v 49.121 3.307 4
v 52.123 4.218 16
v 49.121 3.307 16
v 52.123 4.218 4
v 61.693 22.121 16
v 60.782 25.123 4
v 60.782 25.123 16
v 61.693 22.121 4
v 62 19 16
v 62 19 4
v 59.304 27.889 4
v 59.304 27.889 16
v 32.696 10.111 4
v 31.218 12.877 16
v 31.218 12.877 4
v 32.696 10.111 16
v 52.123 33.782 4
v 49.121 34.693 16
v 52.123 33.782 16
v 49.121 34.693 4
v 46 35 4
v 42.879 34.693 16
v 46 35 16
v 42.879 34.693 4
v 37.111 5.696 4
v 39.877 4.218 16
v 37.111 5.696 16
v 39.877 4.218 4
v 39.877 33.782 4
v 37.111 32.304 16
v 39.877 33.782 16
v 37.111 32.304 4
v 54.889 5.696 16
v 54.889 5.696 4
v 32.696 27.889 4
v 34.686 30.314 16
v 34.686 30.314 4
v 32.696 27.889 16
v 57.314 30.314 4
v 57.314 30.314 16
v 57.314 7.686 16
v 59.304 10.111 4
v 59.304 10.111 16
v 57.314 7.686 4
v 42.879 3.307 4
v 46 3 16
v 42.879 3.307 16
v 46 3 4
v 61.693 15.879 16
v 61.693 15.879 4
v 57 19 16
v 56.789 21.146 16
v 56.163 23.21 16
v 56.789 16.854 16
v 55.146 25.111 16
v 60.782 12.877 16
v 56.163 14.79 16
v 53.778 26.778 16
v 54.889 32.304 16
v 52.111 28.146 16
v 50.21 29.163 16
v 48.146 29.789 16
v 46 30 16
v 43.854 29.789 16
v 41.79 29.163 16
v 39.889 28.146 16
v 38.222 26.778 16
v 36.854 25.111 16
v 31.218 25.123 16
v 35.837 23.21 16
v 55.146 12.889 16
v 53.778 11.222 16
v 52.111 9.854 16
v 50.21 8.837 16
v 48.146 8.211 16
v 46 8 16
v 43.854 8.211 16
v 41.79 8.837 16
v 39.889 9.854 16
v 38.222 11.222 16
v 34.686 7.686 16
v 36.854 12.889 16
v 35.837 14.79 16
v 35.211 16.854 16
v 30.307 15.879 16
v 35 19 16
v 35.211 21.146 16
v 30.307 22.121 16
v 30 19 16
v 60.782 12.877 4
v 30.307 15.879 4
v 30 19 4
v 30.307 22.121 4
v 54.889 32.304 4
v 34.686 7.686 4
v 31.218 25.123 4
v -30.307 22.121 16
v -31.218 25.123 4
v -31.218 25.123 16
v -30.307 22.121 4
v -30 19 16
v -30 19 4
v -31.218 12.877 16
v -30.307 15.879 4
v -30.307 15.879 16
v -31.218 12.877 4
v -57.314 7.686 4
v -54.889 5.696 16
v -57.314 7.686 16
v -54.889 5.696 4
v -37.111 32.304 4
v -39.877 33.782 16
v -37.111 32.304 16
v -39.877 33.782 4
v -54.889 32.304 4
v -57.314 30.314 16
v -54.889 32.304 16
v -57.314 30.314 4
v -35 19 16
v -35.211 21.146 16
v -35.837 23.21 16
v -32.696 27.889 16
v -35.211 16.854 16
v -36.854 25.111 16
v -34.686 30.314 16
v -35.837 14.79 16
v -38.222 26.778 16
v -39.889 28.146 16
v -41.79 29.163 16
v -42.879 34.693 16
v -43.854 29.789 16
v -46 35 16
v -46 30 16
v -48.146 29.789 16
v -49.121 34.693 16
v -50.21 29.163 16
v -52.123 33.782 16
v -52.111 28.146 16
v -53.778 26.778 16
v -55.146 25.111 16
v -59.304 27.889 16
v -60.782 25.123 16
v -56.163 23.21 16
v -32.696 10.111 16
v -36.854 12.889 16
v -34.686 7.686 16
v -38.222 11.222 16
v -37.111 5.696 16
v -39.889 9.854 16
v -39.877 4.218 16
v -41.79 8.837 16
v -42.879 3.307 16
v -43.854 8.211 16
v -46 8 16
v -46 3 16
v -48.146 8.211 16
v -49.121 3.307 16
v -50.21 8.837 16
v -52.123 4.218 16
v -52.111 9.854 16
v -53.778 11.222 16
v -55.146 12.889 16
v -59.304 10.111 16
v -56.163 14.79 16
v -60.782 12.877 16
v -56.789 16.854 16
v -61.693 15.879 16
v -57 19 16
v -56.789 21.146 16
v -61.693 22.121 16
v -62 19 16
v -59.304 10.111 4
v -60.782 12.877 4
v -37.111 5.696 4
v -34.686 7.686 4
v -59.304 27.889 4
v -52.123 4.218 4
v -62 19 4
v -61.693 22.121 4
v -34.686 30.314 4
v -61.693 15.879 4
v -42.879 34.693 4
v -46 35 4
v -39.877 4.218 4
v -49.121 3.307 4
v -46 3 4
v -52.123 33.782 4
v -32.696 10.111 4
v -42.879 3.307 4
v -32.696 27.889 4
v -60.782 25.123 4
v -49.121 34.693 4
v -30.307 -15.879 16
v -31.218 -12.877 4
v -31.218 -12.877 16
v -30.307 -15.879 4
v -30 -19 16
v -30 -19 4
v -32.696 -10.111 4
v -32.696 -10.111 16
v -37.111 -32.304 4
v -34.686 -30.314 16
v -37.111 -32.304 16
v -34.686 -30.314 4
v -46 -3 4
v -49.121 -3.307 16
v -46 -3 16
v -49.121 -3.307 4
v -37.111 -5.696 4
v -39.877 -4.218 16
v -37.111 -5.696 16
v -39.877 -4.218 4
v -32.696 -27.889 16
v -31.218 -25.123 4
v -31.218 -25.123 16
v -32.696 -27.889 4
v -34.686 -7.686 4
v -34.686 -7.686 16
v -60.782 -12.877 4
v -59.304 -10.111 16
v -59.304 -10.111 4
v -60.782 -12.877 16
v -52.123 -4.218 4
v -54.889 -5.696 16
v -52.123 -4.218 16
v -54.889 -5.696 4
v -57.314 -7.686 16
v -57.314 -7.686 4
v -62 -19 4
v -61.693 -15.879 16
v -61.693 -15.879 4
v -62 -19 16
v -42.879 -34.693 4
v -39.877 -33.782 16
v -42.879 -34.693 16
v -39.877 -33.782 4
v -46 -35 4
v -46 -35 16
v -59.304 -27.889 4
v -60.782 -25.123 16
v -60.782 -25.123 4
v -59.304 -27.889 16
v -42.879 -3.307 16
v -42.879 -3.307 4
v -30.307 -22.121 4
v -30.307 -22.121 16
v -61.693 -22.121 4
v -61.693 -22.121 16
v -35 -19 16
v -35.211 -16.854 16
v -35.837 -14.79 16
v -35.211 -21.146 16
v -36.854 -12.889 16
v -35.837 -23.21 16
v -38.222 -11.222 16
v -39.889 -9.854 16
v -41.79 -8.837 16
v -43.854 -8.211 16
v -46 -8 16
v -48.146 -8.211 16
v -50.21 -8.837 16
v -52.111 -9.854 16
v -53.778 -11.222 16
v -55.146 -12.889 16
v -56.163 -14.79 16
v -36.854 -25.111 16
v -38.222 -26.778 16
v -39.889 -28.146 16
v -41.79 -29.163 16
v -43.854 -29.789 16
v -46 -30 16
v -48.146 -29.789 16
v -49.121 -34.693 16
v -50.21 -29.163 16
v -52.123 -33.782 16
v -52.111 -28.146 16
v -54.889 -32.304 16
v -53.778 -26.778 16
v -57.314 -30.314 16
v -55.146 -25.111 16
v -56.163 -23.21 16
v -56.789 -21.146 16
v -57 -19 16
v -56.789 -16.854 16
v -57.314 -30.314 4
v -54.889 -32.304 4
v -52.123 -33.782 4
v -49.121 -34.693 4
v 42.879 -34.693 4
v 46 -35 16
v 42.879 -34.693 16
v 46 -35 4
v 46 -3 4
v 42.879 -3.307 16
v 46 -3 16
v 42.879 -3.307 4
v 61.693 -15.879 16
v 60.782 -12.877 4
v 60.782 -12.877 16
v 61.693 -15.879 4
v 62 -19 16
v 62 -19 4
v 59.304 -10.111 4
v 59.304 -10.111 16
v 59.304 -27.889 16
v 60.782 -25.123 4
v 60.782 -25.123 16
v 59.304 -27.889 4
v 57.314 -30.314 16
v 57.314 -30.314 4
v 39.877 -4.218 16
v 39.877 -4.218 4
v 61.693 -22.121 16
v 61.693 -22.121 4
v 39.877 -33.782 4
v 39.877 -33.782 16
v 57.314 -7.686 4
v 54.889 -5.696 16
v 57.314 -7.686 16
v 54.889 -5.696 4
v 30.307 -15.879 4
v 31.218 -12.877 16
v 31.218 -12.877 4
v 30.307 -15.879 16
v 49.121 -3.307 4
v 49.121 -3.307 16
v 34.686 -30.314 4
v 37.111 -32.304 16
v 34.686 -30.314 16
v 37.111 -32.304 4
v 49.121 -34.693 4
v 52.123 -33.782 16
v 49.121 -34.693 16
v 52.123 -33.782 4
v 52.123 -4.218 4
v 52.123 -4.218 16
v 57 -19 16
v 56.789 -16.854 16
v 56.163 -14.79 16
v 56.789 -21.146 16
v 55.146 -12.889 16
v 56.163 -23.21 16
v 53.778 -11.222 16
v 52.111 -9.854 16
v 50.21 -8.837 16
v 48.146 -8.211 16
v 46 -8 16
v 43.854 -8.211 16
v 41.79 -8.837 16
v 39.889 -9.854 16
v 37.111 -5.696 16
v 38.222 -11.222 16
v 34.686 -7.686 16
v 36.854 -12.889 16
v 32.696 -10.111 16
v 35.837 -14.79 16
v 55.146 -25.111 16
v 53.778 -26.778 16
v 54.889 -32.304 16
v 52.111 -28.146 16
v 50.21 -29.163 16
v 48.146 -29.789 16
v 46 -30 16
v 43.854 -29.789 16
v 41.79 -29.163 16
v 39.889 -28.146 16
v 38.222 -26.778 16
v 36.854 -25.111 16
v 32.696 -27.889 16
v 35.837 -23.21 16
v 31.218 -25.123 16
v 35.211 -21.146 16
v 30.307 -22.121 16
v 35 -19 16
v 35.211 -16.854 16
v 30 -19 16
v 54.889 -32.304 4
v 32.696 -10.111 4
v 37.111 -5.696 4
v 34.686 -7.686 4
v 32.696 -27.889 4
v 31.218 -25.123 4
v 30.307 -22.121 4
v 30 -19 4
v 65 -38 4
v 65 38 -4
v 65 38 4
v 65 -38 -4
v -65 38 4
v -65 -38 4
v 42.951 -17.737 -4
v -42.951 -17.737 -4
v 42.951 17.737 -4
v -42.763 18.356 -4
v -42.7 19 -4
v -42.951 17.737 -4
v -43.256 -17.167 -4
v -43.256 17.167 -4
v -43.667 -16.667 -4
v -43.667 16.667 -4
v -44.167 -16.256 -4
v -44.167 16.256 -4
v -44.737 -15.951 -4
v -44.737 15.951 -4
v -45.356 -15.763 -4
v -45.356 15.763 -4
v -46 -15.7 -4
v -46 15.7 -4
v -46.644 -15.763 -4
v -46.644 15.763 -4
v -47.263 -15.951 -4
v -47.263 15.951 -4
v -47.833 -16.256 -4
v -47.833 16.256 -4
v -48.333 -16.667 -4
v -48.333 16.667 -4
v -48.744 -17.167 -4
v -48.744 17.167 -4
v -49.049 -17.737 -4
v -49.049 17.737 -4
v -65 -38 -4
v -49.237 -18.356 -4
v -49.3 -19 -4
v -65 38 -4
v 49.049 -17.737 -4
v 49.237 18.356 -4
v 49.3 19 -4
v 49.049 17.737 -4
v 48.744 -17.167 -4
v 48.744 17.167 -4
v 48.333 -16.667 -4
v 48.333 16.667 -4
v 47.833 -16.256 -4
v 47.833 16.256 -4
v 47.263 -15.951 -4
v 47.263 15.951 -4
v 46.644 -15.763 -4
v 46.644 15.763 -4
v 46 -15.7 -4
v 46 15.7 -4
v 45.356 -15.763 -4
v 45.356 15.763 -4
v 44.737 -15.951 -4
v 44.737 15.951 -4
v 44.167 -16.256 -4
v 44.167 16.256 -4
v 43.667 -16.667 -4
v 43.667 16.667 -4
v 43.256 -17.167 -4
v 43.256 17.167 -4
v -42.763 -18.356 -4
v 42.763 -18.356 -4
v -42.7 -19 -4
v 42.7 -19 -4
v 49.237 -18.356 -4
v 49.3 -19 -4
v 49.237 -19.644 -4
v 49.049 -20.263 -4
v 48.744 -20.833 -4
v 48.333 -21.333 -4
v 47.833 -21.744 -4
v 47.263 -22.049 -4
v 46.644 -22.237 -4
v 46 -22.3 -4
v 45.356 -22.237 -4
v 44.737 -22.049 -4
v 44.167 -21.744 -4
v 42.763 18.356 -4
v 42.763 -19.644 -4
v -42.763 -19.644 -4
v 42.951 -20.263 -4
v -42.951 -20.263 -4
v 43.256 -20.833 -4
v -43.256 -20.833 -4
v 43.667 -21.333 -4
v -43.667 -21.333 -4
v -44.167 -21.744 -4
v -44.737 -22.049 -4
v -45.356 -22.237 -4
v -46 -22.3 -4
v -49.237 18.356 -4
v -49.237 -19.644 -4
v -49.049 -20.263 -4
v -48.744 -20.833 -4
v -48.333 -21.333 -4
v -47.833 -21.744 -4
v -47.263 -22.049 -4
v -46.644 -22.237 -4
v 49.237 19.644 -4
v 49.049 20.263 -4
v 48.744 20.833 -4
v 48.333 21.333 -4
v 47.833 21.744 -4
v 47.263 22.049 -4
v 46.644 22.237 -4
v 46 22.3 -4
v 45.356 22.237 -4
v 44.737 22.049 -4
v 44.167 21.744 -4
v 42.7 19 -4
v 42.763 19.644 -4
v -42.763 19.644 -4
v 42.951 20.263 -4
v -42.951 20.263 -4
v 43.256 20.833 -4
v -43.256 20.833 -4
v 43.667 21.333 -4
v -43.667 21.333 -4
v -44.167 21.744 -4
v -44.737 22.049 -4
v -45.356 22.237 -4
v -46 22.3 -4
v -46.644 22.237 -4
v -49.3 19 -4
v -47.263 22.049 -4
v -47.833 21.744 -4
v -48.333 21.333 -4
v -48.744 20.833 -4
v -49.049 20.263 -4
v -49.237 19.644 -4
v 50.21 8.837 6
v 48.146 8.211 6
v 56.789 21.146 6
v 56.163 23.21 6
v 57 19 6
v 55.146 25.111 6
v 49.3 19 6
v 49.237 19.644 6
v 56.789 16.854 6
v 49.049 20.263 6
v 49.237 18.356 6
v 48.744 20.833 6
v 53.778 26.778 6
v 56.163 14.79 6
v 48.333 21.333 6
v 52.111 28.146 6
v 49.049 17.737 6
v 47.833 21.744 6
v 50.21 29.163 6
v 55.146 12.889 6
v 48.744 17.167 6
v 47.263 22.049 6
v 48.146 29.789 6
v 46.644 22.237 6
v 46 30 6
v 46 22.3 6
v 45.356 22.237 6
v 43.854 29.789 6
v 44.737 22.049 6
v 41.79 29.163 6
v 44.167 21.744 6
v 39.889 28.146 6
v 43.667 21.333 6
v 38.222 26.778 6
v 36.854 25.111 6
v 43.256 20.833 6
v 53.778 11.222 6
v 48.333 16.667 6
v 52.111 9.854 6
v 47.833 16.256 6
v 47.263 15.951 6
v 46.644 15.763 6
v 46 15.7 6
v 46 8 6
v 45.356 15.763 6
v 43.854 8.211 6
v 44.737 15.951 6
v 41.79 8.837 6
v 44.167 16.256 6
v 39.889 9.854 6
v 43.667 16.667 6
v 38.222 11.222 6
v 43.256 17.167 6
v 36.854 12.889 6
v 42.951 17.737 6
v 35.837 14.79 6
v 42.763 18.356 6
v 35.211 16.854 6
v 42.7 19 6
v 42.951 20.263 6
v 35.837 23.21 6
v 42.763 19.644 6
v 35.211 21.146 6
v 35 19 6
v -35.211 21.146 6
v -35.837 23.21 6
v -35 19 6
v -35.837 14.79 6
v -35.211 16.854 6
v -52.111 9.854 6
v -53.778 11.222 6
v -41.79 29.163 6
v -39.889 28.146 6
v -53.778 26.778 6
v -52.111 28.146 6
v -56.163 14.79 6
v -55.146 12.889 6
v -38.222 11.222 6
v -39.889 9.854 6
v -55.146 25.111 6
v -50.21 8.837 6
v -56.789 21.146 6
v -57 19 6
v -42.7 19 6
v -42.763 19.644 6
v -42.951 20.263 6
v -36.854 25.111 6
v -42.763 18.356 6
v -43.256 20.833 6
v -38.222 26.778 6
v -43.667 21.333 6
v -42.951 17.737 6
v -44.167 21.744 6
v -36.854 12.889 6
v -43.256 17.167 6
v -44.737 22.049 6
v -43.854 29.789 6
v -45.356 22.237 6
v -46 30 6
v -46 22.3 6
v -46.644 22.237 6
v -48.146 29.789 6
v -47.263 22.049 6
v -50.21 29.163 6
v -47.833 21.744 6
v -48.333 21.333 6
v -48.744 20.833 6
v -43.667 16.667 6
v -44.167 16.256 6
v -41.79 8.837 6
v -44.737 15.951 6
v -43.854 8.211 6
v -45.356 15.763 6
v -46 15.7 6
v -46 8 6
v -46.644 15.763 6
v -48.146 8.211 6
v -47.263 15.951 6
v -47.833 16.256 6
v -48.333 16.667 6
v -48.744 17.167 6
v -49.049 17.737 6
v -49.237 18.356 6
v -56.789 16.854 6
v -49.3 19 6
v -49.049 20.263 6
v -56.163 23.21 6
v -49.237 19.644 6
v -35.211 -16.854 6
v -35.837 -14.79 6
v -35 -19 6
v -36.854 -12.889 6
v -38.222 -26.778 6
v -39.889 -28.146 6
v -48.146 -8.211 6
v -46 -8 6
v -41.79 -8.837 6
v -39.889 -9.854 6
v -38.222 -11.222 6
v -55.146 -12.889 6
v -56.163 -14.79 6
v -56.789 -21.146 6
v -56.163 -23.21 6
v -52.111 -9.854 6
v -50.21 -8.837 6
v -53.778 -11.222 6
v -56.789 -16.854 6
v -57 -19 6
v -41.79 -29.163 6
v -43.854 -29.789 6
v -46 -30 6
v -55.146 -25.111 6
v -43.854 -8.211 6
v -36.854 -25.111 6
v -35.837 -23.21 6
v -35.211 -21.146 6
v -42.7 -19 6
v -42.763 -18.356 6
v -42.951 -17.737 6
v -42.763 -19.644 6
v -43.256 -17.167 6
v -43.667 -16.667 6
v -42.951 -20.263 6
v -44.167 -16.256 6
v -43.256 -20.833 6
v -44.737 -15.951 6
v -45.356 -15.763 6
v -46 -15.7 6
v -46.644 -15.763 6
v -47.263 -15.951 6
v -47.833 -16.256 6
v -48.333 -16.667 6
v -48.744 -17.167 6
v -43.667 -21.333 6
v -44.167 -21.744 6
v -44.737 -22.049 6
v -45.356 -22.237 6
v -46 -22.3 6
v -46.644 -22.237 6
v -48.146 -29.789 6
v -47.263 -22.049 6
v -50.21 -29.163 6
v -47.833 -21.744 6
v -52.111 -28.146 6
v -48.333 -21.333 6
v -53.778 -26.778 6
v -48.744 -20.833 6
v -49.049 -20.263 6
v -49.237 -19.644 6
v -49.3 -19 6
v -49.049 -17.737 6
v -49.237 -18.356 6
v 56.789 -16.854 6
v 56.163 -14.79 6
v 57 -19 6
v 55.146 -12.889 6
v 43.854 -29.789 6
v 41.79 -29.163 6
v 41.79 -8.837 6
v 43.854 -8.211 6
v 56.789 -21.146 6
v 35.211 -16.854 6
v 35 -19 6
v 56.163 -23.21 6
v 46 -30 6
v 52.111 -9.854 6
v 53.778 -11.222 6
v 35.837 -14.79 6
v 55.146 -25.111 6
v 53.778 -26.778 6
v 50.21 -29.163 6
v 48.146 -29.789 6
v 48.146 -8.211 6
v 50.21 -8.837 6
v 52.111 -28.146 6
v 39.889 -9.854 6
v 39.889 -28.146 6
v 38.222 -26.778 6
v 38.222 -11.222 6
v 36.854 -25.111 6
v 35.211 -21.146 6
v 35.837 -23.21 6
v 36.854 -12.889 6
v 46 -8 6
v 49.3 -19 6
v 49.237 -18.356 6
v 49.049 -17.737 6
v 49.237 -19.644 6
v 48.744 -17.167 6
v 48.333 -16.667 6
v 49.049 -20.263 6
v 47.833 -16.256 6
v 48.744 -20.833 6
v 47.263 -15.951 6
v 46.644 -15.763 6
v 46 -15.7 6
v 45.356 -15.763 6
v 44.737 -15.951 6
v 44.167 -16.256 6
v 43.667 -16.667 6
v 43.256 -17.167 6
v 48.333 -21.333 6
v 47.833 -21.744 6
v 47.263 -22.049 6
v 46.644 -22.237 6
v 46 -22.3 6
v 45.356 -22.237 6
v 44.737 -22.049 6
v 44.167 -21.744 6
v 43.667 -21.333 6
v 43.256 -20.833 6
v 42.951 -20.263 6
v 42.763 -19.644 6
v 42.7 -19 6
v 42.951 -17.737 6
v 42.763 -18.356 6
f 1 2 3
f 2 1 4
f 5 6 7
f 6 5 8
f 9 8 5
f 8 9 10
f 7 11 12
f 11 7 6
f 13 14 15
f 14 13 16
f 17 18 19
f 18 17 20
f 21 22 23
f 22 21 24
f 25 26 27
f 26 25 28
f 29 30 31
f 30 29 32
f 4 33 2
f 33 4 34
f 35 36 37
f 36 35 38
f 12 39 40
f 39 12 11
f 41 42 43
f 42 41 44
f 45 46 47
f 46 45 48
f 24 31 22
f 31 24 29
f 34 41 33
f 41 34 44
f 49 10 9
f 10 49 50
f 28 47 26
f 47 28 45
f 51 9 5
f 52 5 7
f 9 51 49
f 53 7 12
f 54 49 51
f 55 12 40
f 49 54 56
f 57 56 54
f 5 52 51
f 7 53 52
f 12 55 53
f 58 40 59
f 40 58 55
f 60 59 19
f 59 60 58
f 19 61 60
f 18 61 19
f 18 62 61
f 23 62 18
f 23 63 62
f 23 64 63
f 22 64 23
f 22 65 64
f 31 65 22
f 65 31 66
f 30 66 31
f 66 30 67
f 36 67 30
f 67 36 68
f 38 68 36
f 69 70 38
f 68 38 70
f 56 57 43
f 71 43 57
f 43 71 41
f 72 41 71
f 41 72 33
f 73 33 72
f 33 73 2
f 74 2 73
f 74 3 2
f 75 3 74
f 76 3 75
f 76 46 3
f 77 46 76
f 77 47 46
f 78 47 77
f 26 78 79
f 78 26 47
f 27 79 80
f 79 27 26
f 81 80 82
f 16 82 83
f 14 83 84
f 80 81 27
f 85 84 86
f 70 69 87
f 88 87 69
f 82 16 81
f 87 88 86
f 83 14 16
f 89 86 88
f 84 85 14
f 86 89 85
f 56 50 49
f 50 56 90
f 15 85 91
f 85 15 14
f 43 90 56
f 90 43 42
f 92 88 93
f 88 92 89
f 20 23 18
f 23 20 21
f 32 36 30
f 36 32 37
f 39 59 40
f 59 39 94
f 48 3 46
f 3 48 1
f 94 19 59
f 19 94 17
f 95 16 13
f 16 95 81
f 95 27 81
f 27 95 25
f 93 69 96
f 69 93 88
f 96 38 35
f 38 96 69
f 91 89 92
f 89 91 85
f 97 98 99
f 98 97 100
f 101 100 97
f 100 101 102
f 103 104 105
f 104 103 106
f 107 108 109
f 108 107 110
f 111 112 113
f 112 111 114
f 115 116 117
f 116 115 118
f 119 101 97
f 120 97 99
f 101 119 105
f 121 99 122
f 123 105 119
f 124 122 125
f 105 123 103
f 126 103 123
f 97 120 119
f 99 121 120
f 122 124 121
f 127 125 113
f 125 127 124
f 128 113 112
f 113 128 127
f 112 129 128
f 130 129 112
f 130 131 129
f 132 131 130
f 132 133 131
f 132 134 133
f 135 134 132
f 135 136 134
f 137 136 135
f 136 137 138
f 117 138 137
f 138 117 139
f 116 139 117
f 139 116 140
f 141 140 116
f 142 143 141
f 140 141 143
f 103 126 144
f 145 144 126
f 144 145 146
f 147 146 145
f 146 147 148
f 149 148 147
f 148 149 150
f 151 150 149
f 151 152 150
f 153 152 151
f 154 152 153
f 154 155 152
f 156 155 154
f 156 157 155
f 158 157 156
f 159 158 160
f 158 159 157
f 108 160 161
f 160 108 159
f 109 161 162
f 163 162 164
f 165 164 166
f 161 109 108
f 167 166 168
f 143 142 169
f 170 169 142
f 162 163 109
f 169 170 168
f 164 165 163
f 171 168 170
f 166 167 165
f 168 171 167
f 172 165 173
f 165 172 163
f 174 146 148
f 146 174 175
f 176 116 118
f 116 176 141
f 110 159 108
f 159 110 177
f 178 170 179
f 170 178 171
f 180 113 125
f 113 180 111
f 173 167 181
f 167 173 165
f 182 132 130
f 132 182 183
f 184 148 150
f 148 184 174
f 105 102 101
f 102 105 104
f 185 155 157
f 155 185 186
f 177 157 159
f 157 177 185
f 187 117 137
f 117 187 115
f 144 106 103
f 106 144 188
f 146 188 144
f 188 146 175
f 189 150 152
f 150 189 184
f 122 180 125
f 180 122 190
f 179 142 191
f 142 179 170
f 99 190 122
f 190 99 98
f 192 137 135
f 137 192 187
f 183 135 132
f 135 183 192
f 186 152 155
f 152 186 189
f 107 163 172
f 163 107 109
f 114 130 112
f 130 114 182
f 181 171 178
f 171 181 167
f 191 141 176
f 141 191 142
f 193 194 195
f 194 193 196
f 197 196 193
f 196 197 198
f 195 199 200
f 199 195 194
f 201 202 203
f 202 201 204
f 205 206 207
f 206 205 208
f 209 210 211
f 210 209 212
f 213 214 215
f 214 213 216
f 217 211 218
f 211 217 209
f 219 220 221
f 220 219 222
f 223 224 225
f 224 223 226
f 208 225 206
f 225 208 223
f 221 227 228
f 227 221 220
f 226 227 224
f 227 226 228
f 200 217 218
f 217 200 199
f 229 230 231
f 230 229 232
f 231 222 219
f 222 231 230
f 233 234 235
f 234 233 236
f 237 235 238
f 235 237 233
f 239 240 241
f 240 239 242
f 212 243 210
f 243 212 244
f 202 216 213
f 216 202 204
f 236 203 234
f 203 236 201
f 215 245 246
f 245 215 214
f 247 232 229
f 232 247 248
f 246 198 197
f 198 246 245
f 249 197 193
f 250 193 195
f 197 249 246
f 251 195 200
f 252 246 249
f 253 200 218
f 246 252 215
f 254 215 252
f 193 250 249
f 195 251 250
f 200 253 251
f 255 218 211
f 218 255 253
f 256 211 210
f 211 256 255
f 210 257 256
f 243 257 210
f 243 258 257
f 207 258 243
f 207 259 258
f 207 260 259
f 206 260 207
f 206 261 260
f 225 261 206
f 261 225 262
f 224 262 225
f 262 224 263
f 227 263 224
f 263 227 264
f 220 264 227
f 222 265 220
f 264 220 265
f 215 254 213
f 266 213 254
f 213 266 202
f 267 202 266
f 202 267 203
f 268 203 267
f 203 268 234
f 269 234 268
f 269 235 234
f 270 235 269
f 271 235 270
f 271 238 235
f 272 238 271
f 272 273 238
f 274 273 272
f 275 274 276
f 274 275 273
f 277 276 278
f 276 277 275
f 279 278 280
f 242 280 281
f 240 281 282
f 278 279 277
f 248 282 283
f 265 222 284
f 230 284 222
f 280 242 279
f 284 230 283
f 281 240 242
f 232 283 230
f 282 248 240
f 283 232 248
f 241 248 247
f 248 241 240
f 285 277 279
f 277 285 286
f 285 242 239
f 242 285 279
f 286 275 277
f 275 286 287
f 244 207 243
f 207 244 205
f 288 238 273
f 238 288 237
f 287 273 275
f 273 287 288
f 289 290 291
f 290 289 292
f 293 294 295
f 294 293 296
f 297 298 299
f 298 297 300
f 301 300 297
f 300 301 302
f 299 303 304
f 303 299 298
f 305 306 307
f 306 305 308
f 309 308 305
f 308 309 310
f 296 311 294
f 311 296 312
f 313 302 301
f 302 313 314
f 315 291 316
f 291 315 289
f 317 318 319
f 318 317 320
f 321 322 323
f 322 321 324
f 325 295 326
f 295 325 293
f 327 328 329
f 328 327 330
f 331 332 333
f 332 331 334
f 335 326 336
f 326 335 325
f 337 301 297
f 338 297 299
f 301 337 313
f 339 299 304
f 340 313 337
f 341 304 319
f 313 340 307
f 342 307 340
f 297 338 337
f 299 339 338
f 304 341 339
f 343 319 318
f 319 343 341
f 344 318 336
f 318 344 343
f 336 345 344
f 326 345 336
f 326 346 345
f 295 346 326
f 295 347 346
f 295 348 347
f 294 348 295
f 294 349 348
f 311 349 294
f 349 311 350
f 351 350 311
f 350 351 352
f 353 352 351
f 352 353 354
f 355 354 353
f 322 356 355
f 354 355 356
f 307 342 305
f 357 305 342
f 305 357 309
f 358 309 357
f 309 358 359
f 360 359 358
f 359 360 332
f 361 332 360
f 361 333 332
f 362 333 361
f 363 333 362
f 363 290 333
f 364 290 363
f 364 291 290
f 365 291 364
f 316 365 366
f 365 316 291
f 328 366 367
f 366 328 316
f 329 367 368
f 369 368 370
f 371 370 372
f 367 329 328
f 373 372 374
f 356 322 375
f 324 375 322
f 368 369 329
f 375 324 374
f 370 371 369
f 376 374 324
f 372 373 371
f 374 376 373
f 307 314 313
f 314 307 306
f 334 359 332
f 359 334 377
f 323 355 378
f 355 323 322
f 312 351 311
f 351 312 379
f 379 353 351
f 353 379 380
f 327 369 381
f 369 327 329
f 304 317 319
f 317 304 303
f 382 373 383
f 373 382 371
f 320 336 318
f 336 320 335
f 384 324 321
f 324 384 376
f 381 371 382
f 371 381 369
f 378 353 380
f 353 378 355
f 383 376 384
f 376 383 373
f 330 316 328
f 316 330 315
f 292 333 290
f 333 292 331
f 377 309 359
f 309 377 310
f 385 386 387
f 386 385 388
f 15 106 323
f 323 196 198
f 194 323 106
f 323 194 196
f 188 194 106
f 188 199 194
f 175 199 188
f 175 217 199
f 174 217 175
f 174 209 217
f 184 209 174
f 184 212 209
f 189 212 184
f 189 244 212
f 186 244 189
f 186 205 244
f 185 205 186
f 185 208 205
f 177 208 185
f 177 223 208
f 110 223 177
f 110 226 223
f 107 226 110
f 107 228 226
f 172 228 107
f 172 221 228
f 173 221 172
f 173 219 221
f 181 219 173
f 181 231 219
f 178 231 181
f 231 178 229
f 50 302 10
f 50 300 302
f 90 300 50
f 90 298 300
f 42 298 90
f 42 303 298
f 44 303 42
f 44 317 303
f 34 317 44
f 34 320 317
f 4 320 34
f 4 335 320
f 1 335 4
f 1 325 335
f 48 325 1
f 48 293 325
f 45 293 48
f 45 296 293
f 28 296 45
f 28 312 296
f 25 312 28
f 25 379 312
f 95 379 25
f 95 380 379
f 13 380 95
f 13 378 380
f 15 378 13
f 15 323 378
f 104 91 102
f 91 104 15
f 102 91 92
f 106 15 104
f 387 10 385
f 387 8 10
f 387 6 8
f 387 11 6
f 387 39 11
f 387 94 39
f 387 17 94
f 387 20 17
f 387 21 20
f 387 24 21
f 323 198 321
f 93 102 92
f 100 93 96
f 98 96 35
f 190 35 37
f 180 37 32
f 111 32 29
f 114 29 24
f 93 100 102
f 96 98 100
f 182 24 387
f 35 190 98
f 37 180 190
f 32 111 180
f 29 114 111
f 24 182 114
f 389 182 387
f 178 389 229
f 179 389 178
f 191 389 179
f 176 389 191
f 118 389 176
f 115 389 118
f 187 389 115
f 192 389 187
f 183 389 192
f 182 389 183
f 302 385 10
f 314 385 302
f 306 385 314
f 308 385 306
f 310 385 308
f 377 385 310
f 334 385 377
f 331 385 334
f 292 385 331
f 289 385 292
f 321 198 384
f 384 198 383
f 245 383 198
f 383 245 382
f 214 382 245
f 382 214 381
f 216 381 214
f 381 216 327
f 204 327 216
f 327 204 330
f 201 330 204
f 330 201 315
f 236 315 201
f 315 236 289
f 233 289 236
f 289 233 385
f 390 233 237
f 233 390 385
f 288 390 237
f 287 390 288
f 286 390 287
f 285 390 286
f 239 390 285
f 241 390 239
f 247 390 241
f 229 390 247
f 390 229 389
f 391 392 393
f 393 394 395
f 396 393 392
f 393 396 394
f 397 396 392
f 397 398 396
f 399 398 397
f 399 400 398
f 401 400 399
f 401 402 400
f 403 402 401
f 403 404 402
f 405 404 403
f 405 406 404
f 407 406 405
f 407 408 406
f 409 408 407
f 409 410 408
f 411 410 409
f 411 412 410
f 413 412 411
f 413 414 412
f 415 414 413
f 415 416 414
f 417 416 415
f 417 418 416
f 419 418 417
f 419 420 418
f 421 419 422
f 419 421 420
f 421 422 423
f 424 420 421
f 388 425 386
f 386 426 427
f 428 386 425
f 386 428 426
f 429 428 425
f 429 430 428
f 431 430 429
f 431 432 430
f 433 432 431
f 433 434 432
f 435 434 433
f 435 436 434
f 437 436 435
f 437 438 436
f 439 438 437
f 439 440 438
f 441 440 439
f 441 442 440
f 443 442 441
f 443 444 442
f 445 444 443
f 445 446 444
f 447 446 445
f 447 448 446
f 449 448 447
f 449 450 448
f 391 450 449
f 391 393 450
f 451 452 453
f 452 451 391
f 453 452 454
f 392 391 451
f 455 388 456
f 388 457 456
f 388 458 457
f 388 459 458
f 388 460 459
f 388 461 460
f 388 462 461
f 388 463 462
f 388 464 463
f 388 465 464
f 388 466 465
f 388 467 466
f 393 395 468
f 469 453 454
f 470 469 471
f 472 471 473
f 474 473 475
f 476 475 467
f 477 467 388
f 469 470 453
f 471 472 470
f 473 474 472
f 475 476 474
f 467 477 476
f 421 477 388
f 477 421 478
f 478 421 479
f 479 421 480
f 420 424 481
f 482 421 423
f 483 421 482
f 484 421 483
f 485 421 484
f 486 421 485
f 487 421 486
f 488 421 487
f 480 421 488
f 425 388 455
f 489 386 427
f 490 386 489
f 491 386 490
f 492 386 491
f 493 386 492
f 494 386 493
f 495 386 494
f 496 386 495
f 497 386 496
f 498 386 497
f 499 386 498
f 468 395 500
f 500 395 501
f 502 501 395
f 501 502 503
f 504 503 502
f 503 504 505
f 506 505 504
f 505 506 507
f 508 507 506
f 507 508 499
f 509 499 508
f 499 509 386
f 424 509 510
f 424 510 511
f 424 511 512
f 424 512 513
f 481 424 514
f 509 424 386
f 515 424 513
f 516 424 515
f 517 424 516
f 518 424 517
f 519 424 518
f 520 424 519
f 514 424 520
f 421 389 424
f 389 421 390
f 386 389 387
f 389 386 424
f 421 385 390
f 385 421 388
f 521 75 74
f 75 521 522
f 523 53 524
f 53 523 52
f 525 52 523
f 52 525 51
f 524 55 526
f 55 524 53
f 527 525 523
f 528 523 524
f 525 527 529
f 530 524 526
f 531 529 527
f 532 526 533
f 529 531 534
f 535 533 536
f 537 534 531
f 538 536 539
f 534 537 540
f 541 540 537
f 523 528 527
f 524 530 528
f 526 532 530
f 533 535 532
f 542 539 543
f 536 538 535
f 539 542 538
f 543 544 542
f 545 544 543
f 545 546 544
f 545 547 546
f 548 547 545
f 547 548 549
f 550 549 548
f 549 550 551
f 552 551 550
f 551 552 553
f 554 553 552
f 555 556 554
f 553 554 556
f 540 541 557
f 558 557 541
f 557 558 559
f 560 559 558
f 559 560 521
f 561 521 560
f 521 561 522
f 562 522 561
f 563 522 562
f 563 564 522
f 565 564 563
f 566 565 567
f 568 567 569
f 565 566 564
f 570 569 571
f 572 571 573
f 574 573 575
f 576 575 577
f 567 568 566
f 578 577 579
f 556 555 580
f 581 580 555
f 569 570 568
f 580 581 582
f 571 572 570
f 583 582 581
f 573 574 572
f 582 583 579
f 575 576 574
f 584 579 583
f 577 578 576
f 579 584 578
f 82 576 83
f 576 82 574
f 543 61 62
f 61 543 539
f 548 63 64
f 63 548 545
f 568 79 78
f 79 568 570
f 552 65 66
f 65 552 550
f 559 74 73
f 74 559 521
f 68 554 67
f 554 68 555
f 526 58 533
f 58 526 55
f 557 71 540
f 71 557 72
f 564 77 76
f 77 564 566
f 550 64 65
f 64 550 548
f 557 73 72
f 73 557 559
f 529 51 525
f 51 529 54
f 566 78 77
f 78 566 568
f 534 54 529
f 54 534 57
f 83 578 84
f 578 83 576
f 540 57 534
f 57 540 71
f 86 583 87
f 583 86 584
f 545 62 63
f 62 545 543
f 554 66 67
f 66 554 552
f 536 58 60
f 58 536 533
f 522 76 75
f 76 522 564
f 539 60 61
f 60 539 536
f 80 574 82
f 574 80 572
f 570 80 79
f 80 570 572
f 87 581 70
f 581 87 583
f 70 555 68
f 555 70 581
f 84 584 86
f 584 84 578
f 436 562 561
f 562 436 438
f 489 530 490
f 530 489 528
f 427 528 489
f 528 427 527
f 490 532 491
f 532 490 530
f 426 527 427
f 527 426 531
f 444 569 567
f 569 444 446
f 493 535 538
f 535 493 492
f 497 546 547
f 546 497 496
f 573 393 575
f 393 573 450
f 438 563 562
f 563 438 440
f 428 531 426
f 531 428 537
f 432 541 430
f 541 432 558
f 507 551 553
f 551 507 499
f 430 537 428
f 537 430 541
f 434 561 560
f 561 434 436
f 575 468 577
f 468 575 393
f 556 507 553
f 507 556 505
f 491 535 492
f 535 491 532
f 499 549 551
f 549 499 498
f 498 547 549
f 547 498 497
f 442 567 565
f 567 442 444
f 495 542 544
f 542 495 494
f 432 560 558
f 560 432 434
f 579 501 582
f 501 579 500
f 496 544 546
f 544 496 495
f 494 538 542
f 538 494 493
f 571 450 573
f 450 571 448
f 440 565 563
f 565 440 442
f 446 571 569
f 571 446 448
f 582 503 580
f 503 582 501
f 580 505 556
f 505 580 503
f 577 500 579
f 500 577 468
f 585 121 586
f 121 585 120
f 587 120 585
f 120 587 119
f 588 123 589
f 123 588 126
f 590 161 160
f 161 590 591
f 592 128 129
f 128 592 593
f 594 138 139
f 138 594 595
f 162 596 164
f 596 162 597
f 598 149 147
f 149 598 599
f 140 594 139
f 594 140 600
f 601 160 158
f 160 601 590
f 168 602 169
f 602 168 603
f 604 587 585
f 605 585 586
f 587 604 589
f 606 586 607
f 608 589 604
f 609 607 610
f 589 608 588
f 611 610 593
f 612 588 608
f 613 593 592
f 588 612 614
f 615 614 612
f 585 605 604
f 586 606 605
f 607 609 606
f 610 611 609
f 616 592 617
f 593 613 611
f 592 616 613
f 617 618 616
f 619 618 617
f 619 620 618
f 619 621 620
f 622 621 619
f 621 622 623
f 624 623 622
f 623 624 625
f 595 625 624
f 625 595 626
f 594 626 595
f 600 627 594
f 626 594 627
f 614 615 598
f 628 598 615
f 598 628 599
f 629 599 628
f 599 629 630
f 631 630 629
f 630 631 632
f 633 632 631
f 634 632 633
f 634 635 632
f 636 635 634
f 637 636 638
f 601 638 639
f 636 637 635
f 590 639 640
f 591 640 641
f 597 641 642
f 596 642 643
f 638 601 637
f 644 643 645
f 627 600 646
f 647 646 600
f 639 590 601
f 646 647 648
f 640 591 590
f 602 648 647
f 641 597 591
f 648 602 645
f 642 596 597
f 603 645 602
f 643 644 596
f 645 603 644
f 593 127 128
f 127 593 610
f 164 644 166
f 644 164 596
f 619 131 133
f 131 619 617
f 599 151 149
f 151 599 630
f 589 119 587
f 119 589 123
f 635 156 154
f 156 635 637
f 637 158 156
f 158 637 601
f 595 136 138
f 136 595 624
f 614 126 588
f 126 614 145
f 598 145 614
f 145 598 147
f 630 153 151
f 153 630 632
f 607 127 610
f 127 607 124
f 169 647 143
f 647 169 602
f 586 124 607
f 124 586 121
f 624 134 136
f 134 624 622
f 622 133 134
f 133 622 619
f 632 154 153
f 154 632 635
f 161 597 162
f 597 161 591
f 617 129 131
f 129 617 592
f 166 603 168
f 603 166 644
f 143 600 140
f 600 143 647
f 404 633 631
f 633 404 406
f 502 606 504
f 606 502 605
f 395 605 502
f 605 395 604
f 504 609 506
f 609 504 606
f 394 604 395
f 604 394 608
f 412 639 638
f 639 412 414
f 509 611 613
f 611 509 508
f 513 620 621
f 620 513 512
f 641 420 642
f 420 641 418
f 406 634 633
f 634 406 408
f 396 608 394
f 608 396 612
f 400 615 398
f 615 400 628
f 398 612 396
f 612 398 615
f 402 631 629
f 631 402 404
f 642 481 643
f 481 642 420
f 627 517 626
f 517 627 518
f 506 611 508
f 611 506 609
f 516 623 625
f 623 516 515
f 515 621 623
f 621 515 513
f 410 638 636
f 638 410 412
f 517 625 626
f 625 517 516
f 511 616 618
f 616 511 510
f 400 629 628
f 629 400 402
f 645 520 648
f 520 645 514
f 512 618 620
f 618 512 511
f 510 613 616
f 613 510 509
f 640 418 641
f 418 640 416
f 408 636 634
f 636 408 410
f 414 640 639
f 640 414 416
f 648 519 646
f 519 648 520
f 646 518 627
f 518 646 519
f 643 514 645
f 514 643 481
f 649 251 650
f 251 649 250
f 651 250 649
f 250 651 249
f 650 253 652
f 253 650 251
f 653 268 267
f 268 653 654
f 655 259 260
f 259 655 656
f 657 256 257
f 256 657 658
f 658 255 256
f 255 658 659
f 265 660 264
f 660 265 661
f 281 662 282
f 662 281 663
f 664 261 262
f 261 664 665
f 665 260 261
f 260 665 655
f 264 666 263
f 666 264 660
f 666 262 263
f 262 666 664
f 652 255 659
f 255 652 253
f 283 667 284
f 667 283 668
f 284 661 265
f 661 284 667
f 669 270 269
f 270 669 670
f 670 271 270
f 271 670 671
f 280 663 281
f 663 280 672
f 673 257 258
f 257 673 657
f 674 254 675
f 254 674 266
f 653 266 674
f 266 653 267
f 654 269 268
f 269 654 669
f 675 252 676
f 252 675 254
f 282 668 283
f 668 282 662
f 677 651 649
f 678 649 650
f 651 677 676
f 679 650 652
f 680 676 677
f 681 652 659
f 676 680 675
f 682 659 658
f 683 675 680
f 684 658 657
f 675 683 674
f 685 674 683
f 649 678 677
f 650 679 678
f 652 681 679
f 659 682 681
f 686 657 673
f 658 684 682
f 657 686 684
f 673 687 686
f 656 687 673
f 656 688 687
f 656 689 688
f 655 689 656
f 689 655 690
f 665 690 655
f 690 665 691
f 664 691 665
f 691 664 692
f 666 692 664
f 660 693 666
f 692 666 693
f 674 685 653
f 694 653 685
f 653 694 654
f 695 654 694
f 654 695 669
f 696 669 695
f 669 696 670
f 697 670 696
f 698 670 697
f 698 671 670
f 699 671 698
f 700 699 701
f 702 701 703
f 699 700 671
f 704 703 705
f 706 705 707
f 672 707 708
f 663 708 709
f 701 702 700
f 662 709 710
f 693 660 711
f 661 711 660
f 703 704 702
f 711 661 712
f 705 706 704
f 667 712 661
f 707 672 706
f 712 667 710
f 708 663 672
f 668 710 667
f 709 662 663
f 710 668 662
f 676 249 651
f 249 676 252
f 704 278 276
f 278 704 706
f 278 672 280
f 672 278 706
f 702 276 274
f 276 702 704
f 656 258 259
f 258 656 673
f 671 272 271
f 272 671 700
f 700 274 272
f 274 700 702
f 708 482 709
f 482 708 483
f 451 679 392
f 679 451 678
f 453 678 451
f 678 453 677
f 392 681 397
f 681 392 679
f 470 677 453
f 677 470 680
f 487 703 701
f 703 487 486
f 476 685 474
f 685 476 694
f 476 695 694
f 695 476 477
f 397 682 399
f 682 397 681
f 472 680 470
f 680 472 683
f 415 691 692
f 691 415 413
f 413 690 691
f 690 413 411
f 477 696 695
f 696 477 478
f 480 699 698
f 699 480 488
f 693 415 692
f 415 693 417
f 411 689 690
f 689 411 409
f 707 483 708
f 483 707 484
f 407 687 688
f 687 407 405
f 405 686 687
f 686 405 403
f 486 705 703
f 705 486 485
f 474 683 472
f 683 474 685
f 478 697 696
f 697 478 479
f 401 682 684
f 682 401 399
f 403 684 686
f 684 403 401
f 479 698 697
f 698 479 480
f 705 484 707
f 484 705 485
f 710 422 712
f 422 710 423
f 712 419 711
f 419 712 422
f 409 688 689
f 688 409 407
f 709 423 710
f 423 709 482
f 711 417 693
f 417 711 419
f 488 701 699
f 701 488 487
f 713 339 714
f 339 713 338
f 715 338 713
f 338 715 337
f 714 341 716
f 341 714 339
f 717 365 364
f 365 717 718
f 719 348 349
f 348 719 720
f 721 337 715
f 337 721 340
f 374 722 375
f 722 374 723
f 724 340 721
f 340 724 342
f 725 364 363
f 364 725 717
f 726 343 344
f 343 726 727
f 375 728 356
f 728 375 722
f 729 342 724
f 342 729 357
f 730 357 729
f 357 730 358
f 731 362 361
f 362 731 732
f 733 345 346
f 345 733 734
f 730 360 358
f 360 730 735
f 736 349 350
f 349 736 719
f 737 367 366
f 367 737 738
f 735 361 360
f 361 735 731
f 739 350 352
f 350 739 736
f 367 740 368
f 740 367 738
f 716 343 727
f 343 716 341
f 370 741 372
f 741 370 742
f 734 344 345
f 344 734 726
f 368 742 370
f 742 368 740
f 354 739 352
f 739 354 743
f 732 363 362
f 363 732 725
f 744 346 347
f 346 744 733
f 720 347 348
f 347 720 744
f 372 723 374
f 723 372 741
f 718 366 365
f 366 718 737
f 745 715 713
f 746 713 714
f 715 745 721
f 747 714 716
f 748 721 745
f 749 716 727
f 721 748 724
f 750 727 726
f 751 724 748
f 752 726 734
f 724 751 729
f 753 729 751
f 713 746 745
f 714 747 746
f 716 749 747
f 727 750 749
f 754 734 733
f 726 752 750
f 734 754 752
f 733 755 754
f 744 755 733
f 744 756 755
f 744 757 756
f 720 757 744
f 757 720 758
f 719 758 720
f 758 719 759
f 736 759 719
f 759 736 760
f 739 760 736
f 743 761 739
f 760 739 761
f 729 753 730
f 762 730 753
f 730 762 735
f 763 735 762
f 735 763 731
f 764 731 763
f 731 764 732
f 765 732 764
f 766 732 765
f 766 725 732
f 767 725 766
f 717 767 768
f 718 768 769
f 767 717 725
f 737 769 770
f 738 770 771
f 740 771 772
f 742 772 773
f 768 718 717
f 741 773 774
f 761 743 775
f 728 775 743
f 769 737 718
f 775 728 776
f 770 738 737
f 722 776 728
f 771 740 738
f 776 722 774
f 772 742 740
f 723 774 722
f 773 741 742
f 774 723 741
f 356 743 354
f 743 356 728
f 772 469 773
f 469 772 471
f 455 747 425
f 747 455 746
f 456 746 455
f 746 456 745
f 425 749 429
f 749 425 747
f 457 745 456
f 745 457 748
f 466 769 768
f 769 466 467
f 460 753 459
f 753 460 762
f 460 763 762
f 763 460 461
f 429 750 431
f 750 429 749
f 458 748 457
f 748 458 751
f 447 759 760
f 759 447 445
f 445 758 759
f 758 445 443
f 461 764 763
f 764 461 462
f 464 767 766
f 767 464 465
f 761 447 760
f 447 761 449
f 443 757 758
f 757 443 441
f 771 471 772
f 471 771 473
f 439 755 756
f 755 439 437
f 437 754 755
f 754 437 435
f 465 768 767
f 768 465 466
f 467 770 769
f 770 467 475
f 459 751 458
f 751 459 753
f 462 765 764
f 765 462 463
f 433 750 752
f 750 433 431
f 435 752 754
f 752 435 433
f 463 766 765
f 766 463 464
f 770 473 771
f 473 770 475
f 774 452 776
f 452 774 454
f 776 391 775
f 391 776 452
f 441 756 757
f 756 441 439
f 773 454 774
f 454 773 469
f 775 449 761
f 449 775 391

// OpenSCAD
$fn = 32;

// ----------------------------------------------------------------------
// Socket pad plate
// bosses with counterbored sockets for the screws
// ----------------------------------------------------------------------

// --- parameters (mm) ---
base_t = 8;            // base plate thickness
boss_h = 12;           // boss height above the base plate
boss_d = 32;           // boss diameter
socket_d = 22;         // socket diameter
socket_depth = 10;     // socket depth from the boss face
bolt_d = 6.6;          // screw clearance hole through the socket floor
plate = [130, 76, 8];  // overall size (x, y, z)
edge = 19;             // boss centre offset from the plate edge
pads = 4;              // boss count, one per corner

// --- derived feature positions (mm) ---
height = base_t + boss_h;        // = 20   overall height of the part
corner_x = plate[0] / 2 - edge;  // = 46   boss centre X
corner_y = plate[1] / 2 - edge;  // = 19   boss centre Y
feature_centers = [
  [corner_x, corner_y],
  [-corner_x, corner_y],
  [-corner_x, -corner_y],
  [corner_x, -corner_y]
];   // boss centres: sockets, holes and the pads themselves are placed from here

// base plate, bosses on feature_centers, socket + through hole in each
difference() {
  union() {
    cube(plate, center = true);
    for (centre = feature_centers)
      translate([centre[0], centre[1], plate[2] / 2 - 1])
        cylinder(d = boss_d, h = boss_h + 1);
  }
  for (centre = feature_centers) {
    translate([centre[0], centre[1], plate[2] / 2 + boss_h - socket_depth])
      cylinder(d = socket_d, h = socket_depth + 1);
    translate([centre[0], centre[1], -height])
      cylinder(d = bolt_d, h = 2 * height + 2);  // through the socket floor
  }
}
